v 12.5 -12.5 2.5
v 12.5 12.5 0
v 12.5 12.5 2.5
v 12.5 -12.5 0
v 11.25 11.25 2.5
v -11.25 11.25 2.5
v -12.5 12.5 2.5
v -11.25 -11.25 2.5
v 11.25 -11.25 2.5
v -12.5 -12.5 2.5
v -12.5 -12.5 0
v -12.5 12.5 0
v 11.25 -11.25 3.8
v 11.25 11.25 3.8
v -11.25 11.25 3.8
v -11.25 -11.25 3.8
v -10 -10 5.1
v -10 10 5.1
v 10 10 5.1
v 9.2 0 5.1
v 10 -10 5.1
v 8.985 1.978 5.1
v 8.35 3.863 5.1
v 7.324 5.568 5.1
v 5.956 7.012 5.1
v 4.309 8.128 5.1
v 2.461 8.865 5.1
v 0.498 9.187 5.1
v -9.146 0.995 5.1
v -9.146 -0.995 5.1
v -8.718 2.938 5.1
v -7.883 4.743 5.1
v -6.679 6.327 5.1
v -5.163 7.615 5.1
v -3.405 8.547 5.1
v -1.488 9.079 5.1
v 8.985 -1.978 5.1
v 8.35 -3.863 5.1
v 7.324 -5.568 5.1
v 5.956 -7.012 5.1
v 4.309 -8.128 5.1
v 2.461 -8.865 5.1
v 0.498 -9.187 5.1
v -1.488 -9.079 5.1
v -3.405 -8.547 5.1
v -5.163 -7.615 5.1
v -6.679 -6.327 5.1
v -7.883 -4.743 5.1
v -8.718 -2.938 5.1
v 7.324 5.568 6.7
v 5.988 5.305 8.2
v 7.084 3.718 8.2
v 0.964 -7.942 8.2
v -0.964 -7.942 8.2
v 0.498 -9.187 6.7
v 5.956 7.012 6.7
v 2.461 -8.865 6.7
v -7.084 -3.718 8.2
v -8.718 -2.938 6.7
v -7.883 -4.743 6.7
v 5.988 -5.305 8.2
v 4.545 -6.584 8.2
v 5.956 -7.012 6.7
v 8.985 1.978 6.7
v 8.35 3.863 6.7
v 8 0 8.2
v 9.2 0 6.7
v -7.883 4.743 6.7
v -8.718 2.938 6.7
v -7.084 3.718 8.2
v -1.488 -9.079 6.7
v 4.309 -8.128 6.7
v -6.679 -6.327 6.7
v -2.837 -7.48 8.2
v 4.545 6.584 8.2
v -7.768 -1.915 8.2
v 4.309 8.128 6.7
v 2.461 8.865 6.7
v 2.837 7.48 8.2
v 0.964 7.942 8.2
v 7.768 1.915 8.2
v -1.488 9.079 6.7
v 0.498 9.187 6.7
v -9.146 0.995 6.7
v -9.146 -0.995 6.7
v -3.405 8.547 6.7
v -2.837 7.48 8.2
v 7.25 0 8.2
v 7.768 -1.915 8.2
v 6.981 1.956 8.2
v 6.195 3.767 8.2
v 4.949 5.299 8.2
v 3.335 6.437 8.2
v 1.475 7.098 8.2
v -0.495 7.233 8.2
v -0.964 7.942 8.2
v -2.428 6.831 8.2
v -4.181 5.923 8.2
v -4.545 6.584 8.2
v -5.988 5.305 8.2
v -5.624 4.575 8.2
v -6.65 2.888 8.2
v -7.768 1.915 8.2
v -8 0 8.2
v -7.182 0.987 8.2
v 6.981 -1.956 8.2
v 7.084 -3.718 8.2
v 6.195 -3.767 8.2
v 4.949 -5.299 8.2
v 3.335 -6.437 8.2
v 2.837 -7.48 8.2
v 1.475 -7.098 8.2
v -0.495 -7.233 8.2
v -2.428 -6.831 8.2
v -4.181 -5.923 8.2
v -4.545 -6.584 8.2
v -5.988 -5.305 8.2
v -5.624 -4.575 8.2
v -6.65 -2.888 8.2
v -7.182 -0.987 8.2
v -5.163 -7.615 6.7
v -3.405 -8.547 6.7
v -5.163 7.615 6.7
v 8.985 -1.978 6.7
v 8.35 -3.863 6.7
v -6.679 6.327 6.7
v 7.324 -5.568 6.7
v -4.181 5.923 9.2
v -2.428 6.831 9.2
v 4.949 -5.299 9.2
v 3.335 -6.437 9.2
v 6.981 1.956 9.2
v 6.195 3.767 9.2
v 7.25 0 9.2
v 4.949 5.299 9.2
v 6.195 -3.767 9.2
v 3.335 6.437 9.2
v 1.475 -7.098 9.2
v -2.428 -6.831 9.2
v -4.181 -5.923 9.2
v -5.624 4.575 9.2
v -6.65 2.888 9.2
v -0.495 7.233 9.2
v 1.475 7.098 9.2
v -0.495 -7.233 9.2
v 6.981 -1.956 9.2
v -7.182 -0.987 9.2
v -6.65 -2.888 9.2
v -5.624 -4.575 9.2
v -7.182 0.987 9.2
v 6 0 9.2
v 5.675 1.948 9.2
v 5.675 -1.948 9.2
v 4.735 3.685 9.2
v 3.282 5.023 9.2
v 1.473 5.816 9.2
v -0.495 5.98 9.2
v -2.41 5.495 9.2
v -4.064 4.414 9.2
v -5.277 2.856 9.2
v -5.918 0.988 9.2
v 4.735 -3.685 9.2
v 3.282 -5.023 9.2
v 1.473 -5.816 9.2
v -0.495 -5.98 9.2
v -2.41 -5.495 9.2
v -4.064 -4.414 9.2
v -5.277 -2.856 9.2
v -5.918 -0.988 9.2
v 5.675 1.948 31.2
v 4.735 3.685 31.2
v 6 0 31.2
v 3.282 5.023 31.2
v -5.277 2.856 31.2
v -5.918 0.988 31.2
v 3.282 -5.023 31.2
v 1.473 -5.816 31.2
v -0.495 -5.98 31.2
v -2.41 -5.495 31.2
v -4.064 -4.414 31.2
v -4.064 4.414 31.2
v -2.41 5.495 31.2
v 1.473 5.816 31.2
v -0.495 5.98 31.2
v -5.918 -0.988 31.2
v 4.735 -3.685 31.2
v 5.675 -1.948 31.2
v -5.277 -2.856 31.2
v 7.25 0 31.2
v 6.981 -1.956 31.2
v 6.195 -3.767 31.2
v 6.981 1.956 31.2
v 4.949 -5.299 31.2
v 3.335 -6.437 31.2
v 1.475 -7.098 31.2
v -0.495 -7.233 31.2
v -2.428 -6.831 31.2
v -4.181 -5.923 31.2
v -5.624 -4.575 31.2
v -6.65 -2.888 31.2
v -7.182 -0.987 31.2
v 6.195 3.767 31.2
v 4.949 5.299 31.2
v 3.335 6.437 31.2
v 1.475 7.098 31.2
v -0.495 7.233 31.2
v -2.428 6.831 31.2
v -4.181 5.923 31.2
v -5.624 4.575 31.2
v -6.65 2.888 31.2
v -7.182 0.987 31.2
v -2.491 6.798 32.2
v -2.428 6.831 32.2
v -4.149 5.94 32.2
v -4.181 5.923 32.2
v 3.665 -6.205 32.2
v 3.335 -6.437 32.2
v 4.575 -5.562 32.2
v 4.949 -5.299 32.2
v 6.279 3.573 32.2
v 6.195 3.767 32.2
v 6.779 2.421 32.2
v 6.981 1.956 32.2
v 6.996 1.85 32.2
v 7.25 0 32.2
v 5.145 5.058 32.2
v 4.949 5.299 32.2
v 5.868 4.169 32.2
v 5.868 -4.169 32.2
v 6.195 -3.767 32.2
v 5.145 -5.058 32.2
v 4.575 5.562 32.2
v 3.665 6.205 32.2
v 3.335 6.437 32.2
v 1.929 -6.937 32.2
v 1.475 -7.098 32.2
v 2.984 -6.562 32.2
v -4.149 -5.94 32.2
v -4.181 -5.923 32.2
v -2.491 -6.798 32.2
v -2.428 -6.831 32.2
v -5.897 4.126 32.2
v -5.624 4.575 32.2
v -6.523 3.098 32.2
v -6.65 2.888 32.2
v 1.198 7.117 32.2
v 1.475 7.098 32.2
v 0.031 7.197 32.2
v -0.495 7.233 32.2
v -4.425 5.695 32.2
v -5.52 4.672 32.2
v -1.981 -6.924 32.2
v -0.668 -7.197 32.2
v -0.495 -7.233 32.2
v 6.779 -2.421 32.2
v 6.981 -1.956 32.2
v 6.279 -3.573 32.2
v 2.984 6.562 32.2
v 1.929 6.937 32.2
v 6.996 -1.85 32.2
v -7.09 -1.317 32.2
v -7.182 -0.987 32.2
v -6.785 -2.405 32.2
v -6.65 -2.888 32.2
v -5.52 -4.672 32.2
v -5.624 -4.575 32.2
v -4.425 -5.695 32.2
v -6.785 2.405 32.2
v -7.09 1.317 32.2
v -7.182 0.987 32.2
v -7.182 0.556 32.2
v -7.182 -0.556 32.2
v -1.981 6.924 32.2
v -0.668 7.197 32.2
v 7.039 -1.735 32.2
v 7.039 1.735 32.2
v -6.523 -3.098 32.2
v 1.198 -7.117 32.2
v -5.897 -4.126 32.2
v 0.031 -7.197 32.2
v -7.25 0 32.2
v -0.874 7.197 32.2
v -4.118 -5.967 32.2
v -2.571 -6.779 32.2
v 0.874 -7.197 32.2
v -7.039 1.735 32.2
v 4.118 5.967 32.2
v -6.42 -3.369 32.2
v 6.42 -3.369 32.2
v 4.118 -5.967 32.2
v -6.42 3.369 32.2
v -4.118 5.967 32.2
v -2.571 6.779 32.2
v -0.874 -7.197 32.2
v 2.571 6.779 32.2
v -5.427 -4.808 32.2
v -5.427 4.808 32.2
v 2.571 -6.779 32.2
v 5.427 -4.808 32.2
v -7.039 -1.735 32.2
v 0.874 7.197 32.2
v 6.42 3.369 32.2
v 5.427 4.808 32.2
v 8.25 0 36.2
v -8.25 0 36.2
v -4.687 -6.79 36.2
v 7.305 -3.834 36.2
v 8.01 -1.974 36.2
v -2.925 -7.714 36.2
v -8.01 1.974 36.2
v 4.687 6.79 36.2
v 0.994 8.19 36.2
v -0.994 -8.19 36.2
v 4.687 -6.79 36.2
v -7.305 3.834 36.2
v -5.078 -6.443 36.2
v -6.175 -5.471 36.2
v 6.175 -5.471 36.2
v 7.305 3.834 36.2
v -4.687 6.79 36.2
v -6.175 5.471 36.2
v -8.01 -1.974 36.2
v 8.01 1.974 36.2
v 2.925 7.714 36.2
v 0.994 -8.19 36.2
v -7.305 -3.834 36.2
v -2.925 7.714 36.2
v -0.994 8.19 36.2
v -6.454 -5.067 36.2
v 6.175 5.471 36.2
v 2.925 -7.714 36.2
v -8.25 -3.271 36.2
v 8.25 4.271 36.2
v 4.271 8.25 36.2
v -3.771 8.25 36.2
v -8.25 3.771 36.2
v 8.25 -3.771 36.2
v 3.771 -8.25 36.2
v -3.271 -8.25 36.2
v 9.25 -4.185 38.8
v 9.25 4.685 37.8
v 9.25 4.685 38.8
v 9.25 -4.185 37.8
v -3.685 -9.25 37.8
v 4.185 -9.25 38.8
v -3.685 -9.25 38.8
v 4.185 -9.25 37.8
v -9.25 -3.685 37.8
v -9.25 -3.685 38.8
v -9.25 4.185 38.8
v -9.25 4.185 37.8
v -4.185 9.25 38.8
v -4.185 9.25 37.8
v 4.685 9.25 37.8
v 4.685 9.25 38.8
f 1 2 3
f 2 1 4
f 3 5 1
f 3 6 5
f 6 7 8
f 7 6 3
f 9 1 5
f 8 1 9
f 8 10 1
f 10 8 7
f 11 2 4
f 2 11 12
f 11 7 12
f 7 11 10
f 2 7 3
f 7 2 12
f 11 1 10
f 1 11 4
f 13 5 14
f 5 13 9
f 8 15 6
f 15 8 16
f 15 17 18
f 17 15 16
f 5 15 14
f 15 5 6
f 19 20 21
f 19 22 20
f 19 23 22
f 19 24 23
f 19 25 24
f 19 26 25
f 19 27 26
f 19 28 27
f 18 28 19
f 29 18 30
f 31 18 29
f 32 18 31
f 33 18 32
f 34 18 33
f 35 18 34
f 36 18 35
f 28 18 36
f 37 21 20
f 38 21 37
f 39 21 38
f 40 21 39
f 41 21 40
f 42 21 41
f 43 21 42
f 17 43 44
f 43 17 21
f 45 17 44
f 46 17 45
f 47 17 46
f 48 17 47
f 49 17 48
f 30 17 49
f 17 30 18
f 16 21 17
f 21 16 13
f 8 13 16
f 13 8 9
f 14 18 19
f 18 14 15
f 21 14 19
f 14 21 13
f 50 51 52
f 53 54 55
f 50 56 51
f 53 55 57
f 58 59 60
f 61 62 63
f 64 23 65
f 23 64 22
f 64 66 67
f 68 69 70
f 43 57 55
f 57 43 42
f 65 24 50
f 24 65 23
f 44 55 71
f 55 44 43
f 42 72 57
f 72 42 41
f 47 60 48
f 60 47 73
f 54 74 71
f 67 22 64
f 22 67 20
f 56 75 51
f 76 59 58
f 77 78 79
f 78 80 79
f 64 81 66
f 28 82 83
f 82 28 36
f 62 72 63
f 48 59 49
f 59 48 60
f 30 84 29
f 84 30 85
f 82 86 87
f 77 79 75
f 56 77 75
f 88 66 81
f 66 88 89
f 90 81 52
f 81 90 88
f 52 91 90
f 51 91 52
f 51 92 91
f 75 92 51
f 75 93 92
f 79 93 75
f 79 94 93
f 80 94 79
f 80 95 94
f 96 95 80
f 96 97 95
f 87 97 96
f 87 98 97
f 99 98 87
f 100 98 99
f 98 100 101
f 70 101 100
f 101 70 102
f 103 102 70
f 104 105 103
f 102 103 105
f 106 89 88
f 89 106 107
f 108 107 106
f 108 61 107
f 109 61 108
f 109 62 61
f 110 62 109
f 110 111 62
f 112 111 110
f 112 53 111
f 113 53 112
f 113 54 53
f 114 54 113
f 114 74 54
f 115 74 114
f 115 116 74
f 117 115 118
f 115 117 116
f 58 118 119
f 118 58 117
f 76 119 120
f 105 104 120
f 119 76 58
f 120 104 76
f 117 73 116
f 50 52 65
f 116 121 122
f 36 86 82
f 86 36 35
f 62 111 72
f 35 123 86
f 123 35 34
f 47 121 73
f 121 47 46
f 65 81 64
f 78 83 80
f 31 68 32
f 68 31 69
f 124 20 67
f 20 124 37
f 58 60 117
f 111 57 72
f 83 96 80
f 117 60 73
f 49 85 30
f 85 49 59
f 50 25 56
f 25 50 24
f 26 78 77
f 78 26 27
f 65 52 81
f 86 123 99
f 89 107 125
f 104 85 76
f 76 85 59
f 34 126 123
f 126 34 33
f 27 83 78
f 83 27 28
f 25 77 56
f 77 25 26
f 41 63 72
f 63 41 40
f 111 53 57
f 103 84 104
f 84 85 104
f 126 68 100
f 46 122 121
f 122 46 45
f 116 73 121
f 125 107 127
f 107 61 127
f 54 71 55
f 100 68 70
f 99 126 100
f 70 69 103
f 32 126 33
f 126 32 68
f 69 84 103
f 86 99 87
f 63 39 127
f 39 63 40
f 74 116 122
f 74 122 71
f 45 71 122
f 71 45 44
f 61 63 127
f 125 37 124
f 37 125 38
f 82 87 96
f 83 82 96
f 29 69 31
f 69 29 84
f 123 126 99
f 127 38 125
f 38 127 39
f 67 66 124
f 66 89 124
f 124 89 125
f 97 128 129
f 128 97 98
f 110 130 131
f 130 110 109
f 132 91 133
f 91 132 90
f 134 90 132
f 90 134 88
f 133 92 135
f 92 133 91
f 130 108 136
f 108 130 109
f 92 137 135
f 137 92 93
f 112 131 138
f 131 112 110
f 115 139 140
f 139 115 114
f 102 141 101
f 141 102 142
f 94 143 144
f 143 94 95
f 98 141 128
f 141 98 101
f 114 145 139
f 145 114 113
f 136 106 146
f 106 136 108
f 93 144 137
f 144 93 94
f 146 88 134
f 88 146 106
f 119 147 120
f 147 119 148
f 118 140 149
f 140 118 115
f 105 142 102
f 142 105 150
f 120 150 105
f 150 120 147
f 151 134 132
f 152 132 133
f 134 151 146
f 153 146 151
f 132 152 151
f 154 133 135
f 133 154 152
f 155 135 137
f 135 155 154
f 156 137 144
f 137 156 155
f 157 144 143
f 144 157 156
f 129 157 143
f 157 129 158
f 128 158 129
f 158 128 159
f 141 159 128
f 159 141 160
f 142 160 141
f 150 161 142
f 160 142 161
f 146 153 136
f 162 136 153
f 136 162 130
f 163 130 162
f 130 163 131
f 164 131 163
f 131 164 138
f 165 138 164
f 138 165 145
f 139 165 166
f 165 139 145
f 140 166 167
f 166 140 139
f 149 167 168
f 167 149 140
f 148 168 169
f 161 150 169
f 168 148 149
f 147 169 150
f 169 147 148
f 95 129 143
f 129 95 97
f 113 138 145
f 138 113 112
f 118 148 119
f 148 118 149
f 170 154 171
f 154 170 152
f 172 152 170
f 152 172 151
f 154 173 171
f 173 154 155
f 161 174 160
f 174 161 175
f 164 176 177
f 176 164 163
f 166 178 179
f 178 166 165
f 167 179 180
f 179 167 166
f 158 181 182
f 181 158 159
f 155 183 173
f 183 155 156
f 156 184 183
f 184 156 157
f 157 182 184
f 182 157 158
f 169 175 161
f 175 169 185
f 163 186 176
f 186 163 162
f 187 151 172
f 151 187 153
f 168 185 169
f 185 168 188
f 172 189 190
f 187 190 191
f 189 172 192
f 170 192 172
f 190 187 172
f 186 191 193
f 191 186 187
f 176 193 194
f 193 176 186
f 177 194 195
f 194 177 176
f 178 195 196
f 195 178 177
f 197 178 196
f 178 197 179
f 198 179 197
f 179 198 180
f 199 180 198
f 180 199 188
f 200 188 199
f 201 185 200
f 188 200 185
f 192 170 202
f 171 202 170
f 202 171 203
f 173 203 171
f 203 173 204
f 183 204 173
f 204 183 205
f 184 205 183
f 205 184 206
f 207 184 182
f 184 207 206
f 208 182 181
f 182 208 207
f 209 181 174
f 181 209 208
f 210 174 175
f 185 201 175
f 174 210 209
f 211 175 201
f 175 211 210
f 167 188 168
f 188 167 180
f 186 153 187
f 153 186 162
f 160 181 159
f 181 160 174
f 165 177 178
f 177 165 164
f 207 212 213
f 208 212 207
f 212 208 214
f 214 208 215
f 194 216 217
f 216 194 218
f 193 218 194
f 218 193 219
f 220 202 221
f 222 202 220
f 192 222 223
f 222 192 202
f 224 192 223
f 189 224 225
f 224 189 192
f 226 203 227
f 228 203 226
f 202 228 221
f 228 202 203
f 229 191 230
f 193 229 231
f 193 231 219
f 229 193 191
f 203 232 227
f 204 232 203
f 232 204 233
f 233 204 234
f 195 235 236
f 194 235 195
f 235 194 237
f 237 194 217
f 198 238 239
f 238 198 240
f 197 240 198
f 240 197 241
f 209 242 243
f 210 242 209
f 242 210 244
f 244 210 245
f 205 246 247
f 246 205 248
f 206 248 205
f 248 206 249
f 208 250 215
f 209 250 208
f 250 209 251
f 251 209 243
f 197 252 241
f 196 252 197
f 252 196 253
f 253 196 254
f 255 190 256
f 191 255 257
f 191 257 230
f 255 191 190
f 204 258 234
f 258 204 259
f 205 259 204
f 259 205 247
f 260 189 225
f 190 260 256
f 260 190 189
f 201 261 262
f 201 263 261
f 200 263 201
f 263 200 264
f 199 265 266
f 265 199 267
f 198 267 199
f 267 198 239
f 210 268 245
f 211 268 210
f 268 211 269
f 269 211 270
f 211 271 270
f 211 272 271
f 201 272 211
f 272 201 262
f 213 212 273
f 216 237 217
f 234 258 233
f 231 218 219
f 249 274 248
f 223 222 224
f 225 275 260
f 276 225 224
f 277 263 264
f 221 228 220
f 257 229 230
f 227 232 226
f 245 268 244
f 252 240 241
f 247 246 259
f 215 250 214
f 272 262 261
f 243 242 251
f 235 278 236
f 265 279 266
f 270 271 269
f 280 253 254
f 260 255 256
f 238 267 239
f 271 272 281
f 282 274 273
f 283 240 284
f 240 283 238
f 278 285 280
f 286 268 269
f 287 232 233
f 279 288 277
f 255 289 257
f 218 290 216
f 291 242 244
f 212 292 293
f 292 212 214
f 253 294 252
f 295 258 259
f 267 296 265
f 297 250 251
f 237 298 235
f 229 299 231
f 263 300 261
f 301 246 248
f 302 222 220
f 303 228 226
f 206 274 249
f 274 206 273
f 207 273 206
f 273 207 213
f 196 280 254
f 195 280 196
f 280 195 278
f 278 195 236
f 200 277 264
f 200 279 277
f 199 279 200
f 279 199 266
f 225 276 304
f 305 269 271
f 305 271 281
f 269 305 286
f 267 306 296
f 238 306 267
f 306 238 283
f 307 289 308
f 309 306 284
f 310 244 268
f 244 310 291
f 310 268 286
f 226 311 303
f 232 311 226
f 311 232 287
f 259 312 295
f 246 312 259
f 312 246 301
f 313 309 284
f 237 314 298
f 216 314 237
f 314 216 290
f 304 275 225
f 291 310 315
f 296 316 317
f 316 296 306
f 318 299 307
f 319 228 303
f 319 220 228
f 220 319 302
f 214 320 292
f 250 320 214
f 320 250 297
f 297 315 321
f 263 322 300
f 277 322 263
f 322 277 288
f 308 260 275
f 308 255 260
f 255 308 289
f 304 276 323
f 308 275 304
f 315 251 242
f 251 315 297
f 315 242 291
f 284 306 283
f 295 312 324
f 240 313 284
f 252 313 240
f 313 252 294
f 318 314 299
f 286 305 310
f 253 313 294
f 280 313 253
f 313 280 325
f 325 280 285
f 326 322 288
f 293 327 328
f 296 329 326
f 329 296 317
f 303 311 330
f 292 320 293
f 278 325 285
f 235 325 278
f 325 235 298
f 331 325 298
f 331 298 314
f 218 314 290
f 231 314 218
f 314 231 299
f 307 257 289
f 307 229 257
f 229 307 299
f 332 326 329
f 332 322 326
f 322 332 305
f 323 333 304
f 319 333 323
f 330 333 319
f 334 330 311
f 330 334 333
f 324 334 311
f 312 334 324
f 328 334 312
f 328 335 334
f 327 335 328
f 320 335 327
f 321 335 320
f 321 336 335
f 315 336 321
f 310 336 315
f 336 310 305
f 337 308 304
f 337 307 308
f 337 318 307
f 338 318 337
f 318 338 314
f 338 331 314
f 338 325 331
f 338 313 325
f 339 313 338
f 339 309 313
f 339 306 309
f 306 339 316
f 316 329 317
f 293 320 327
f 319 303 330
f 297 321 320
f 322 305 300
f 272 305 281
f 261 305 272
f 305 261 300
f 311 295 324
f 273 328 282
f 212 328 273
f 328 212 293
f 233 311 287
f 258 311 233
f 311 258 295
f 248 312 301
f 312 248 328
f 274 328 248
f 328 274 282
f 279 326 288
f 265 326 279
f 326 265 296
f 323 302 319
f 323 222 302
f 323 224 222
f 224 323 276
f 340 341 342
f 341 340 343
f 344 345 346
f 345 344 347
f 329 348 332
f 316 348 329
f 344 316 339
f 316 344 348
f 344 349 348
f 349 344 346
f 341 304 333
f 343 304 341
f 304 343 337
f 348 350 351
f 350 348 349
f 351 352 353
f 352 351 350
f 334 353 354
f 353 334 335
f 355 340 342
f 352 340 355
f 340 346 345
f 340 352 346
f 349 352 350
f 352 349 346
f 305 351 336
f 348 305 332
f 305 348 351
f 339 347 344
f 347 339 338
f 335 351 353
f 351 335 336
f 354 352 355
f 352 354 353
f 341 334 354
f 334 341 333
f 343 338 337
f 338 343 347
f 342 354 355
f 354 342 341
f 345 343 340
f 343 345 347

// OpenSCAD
union() {
  translate([-12.5, -12.5, 0]) cube([25,25,2.5]);
  hull() {
    translate([-11.25, -11.25, 2.5]) cube([22.5, 22.5, 1.3]);
    translate([-10, -10, 3.8]) cube([20, 20, 1.3]);
  }
  hull() {
    translate([0,0,5.1]) cylinder(1.6,9.2,9.2);
    translate([0,0,6.7]) cylinder(1.5,8,8); // 8.2
  }

  translate([0,0,8.2]) cylinder(1,7.25,7.25);
  translate([0,0,9.2]) cylinder(22,6,6);
  translate([0,0,31.2]) cylinder(1,7.25,7.25);
  translate([0,0,32.2]) cylinder(4,7.25,8.25); //36.2
  hull() {
    translate([-8.25,-8.25,36.2]) intersection() {
      cube([16.5, 16.5, 1.6]);
      translate([0,-24.04163056/2,0]) rotate([0,0,45]) translate([24.04163056/2,0,0]) cube([17,17,1.6]);  
    }
    translate([-9.25,-9.25,37.8]) intersection() {
      cube([18.5, 18.5, 1]);
      translate([0,-26.870057685/2,0]) rotate([0,0,45]) translate([26.870057685/2,0,0]) cube([19,19,1]);  
    }
  } //total 38.8
}
